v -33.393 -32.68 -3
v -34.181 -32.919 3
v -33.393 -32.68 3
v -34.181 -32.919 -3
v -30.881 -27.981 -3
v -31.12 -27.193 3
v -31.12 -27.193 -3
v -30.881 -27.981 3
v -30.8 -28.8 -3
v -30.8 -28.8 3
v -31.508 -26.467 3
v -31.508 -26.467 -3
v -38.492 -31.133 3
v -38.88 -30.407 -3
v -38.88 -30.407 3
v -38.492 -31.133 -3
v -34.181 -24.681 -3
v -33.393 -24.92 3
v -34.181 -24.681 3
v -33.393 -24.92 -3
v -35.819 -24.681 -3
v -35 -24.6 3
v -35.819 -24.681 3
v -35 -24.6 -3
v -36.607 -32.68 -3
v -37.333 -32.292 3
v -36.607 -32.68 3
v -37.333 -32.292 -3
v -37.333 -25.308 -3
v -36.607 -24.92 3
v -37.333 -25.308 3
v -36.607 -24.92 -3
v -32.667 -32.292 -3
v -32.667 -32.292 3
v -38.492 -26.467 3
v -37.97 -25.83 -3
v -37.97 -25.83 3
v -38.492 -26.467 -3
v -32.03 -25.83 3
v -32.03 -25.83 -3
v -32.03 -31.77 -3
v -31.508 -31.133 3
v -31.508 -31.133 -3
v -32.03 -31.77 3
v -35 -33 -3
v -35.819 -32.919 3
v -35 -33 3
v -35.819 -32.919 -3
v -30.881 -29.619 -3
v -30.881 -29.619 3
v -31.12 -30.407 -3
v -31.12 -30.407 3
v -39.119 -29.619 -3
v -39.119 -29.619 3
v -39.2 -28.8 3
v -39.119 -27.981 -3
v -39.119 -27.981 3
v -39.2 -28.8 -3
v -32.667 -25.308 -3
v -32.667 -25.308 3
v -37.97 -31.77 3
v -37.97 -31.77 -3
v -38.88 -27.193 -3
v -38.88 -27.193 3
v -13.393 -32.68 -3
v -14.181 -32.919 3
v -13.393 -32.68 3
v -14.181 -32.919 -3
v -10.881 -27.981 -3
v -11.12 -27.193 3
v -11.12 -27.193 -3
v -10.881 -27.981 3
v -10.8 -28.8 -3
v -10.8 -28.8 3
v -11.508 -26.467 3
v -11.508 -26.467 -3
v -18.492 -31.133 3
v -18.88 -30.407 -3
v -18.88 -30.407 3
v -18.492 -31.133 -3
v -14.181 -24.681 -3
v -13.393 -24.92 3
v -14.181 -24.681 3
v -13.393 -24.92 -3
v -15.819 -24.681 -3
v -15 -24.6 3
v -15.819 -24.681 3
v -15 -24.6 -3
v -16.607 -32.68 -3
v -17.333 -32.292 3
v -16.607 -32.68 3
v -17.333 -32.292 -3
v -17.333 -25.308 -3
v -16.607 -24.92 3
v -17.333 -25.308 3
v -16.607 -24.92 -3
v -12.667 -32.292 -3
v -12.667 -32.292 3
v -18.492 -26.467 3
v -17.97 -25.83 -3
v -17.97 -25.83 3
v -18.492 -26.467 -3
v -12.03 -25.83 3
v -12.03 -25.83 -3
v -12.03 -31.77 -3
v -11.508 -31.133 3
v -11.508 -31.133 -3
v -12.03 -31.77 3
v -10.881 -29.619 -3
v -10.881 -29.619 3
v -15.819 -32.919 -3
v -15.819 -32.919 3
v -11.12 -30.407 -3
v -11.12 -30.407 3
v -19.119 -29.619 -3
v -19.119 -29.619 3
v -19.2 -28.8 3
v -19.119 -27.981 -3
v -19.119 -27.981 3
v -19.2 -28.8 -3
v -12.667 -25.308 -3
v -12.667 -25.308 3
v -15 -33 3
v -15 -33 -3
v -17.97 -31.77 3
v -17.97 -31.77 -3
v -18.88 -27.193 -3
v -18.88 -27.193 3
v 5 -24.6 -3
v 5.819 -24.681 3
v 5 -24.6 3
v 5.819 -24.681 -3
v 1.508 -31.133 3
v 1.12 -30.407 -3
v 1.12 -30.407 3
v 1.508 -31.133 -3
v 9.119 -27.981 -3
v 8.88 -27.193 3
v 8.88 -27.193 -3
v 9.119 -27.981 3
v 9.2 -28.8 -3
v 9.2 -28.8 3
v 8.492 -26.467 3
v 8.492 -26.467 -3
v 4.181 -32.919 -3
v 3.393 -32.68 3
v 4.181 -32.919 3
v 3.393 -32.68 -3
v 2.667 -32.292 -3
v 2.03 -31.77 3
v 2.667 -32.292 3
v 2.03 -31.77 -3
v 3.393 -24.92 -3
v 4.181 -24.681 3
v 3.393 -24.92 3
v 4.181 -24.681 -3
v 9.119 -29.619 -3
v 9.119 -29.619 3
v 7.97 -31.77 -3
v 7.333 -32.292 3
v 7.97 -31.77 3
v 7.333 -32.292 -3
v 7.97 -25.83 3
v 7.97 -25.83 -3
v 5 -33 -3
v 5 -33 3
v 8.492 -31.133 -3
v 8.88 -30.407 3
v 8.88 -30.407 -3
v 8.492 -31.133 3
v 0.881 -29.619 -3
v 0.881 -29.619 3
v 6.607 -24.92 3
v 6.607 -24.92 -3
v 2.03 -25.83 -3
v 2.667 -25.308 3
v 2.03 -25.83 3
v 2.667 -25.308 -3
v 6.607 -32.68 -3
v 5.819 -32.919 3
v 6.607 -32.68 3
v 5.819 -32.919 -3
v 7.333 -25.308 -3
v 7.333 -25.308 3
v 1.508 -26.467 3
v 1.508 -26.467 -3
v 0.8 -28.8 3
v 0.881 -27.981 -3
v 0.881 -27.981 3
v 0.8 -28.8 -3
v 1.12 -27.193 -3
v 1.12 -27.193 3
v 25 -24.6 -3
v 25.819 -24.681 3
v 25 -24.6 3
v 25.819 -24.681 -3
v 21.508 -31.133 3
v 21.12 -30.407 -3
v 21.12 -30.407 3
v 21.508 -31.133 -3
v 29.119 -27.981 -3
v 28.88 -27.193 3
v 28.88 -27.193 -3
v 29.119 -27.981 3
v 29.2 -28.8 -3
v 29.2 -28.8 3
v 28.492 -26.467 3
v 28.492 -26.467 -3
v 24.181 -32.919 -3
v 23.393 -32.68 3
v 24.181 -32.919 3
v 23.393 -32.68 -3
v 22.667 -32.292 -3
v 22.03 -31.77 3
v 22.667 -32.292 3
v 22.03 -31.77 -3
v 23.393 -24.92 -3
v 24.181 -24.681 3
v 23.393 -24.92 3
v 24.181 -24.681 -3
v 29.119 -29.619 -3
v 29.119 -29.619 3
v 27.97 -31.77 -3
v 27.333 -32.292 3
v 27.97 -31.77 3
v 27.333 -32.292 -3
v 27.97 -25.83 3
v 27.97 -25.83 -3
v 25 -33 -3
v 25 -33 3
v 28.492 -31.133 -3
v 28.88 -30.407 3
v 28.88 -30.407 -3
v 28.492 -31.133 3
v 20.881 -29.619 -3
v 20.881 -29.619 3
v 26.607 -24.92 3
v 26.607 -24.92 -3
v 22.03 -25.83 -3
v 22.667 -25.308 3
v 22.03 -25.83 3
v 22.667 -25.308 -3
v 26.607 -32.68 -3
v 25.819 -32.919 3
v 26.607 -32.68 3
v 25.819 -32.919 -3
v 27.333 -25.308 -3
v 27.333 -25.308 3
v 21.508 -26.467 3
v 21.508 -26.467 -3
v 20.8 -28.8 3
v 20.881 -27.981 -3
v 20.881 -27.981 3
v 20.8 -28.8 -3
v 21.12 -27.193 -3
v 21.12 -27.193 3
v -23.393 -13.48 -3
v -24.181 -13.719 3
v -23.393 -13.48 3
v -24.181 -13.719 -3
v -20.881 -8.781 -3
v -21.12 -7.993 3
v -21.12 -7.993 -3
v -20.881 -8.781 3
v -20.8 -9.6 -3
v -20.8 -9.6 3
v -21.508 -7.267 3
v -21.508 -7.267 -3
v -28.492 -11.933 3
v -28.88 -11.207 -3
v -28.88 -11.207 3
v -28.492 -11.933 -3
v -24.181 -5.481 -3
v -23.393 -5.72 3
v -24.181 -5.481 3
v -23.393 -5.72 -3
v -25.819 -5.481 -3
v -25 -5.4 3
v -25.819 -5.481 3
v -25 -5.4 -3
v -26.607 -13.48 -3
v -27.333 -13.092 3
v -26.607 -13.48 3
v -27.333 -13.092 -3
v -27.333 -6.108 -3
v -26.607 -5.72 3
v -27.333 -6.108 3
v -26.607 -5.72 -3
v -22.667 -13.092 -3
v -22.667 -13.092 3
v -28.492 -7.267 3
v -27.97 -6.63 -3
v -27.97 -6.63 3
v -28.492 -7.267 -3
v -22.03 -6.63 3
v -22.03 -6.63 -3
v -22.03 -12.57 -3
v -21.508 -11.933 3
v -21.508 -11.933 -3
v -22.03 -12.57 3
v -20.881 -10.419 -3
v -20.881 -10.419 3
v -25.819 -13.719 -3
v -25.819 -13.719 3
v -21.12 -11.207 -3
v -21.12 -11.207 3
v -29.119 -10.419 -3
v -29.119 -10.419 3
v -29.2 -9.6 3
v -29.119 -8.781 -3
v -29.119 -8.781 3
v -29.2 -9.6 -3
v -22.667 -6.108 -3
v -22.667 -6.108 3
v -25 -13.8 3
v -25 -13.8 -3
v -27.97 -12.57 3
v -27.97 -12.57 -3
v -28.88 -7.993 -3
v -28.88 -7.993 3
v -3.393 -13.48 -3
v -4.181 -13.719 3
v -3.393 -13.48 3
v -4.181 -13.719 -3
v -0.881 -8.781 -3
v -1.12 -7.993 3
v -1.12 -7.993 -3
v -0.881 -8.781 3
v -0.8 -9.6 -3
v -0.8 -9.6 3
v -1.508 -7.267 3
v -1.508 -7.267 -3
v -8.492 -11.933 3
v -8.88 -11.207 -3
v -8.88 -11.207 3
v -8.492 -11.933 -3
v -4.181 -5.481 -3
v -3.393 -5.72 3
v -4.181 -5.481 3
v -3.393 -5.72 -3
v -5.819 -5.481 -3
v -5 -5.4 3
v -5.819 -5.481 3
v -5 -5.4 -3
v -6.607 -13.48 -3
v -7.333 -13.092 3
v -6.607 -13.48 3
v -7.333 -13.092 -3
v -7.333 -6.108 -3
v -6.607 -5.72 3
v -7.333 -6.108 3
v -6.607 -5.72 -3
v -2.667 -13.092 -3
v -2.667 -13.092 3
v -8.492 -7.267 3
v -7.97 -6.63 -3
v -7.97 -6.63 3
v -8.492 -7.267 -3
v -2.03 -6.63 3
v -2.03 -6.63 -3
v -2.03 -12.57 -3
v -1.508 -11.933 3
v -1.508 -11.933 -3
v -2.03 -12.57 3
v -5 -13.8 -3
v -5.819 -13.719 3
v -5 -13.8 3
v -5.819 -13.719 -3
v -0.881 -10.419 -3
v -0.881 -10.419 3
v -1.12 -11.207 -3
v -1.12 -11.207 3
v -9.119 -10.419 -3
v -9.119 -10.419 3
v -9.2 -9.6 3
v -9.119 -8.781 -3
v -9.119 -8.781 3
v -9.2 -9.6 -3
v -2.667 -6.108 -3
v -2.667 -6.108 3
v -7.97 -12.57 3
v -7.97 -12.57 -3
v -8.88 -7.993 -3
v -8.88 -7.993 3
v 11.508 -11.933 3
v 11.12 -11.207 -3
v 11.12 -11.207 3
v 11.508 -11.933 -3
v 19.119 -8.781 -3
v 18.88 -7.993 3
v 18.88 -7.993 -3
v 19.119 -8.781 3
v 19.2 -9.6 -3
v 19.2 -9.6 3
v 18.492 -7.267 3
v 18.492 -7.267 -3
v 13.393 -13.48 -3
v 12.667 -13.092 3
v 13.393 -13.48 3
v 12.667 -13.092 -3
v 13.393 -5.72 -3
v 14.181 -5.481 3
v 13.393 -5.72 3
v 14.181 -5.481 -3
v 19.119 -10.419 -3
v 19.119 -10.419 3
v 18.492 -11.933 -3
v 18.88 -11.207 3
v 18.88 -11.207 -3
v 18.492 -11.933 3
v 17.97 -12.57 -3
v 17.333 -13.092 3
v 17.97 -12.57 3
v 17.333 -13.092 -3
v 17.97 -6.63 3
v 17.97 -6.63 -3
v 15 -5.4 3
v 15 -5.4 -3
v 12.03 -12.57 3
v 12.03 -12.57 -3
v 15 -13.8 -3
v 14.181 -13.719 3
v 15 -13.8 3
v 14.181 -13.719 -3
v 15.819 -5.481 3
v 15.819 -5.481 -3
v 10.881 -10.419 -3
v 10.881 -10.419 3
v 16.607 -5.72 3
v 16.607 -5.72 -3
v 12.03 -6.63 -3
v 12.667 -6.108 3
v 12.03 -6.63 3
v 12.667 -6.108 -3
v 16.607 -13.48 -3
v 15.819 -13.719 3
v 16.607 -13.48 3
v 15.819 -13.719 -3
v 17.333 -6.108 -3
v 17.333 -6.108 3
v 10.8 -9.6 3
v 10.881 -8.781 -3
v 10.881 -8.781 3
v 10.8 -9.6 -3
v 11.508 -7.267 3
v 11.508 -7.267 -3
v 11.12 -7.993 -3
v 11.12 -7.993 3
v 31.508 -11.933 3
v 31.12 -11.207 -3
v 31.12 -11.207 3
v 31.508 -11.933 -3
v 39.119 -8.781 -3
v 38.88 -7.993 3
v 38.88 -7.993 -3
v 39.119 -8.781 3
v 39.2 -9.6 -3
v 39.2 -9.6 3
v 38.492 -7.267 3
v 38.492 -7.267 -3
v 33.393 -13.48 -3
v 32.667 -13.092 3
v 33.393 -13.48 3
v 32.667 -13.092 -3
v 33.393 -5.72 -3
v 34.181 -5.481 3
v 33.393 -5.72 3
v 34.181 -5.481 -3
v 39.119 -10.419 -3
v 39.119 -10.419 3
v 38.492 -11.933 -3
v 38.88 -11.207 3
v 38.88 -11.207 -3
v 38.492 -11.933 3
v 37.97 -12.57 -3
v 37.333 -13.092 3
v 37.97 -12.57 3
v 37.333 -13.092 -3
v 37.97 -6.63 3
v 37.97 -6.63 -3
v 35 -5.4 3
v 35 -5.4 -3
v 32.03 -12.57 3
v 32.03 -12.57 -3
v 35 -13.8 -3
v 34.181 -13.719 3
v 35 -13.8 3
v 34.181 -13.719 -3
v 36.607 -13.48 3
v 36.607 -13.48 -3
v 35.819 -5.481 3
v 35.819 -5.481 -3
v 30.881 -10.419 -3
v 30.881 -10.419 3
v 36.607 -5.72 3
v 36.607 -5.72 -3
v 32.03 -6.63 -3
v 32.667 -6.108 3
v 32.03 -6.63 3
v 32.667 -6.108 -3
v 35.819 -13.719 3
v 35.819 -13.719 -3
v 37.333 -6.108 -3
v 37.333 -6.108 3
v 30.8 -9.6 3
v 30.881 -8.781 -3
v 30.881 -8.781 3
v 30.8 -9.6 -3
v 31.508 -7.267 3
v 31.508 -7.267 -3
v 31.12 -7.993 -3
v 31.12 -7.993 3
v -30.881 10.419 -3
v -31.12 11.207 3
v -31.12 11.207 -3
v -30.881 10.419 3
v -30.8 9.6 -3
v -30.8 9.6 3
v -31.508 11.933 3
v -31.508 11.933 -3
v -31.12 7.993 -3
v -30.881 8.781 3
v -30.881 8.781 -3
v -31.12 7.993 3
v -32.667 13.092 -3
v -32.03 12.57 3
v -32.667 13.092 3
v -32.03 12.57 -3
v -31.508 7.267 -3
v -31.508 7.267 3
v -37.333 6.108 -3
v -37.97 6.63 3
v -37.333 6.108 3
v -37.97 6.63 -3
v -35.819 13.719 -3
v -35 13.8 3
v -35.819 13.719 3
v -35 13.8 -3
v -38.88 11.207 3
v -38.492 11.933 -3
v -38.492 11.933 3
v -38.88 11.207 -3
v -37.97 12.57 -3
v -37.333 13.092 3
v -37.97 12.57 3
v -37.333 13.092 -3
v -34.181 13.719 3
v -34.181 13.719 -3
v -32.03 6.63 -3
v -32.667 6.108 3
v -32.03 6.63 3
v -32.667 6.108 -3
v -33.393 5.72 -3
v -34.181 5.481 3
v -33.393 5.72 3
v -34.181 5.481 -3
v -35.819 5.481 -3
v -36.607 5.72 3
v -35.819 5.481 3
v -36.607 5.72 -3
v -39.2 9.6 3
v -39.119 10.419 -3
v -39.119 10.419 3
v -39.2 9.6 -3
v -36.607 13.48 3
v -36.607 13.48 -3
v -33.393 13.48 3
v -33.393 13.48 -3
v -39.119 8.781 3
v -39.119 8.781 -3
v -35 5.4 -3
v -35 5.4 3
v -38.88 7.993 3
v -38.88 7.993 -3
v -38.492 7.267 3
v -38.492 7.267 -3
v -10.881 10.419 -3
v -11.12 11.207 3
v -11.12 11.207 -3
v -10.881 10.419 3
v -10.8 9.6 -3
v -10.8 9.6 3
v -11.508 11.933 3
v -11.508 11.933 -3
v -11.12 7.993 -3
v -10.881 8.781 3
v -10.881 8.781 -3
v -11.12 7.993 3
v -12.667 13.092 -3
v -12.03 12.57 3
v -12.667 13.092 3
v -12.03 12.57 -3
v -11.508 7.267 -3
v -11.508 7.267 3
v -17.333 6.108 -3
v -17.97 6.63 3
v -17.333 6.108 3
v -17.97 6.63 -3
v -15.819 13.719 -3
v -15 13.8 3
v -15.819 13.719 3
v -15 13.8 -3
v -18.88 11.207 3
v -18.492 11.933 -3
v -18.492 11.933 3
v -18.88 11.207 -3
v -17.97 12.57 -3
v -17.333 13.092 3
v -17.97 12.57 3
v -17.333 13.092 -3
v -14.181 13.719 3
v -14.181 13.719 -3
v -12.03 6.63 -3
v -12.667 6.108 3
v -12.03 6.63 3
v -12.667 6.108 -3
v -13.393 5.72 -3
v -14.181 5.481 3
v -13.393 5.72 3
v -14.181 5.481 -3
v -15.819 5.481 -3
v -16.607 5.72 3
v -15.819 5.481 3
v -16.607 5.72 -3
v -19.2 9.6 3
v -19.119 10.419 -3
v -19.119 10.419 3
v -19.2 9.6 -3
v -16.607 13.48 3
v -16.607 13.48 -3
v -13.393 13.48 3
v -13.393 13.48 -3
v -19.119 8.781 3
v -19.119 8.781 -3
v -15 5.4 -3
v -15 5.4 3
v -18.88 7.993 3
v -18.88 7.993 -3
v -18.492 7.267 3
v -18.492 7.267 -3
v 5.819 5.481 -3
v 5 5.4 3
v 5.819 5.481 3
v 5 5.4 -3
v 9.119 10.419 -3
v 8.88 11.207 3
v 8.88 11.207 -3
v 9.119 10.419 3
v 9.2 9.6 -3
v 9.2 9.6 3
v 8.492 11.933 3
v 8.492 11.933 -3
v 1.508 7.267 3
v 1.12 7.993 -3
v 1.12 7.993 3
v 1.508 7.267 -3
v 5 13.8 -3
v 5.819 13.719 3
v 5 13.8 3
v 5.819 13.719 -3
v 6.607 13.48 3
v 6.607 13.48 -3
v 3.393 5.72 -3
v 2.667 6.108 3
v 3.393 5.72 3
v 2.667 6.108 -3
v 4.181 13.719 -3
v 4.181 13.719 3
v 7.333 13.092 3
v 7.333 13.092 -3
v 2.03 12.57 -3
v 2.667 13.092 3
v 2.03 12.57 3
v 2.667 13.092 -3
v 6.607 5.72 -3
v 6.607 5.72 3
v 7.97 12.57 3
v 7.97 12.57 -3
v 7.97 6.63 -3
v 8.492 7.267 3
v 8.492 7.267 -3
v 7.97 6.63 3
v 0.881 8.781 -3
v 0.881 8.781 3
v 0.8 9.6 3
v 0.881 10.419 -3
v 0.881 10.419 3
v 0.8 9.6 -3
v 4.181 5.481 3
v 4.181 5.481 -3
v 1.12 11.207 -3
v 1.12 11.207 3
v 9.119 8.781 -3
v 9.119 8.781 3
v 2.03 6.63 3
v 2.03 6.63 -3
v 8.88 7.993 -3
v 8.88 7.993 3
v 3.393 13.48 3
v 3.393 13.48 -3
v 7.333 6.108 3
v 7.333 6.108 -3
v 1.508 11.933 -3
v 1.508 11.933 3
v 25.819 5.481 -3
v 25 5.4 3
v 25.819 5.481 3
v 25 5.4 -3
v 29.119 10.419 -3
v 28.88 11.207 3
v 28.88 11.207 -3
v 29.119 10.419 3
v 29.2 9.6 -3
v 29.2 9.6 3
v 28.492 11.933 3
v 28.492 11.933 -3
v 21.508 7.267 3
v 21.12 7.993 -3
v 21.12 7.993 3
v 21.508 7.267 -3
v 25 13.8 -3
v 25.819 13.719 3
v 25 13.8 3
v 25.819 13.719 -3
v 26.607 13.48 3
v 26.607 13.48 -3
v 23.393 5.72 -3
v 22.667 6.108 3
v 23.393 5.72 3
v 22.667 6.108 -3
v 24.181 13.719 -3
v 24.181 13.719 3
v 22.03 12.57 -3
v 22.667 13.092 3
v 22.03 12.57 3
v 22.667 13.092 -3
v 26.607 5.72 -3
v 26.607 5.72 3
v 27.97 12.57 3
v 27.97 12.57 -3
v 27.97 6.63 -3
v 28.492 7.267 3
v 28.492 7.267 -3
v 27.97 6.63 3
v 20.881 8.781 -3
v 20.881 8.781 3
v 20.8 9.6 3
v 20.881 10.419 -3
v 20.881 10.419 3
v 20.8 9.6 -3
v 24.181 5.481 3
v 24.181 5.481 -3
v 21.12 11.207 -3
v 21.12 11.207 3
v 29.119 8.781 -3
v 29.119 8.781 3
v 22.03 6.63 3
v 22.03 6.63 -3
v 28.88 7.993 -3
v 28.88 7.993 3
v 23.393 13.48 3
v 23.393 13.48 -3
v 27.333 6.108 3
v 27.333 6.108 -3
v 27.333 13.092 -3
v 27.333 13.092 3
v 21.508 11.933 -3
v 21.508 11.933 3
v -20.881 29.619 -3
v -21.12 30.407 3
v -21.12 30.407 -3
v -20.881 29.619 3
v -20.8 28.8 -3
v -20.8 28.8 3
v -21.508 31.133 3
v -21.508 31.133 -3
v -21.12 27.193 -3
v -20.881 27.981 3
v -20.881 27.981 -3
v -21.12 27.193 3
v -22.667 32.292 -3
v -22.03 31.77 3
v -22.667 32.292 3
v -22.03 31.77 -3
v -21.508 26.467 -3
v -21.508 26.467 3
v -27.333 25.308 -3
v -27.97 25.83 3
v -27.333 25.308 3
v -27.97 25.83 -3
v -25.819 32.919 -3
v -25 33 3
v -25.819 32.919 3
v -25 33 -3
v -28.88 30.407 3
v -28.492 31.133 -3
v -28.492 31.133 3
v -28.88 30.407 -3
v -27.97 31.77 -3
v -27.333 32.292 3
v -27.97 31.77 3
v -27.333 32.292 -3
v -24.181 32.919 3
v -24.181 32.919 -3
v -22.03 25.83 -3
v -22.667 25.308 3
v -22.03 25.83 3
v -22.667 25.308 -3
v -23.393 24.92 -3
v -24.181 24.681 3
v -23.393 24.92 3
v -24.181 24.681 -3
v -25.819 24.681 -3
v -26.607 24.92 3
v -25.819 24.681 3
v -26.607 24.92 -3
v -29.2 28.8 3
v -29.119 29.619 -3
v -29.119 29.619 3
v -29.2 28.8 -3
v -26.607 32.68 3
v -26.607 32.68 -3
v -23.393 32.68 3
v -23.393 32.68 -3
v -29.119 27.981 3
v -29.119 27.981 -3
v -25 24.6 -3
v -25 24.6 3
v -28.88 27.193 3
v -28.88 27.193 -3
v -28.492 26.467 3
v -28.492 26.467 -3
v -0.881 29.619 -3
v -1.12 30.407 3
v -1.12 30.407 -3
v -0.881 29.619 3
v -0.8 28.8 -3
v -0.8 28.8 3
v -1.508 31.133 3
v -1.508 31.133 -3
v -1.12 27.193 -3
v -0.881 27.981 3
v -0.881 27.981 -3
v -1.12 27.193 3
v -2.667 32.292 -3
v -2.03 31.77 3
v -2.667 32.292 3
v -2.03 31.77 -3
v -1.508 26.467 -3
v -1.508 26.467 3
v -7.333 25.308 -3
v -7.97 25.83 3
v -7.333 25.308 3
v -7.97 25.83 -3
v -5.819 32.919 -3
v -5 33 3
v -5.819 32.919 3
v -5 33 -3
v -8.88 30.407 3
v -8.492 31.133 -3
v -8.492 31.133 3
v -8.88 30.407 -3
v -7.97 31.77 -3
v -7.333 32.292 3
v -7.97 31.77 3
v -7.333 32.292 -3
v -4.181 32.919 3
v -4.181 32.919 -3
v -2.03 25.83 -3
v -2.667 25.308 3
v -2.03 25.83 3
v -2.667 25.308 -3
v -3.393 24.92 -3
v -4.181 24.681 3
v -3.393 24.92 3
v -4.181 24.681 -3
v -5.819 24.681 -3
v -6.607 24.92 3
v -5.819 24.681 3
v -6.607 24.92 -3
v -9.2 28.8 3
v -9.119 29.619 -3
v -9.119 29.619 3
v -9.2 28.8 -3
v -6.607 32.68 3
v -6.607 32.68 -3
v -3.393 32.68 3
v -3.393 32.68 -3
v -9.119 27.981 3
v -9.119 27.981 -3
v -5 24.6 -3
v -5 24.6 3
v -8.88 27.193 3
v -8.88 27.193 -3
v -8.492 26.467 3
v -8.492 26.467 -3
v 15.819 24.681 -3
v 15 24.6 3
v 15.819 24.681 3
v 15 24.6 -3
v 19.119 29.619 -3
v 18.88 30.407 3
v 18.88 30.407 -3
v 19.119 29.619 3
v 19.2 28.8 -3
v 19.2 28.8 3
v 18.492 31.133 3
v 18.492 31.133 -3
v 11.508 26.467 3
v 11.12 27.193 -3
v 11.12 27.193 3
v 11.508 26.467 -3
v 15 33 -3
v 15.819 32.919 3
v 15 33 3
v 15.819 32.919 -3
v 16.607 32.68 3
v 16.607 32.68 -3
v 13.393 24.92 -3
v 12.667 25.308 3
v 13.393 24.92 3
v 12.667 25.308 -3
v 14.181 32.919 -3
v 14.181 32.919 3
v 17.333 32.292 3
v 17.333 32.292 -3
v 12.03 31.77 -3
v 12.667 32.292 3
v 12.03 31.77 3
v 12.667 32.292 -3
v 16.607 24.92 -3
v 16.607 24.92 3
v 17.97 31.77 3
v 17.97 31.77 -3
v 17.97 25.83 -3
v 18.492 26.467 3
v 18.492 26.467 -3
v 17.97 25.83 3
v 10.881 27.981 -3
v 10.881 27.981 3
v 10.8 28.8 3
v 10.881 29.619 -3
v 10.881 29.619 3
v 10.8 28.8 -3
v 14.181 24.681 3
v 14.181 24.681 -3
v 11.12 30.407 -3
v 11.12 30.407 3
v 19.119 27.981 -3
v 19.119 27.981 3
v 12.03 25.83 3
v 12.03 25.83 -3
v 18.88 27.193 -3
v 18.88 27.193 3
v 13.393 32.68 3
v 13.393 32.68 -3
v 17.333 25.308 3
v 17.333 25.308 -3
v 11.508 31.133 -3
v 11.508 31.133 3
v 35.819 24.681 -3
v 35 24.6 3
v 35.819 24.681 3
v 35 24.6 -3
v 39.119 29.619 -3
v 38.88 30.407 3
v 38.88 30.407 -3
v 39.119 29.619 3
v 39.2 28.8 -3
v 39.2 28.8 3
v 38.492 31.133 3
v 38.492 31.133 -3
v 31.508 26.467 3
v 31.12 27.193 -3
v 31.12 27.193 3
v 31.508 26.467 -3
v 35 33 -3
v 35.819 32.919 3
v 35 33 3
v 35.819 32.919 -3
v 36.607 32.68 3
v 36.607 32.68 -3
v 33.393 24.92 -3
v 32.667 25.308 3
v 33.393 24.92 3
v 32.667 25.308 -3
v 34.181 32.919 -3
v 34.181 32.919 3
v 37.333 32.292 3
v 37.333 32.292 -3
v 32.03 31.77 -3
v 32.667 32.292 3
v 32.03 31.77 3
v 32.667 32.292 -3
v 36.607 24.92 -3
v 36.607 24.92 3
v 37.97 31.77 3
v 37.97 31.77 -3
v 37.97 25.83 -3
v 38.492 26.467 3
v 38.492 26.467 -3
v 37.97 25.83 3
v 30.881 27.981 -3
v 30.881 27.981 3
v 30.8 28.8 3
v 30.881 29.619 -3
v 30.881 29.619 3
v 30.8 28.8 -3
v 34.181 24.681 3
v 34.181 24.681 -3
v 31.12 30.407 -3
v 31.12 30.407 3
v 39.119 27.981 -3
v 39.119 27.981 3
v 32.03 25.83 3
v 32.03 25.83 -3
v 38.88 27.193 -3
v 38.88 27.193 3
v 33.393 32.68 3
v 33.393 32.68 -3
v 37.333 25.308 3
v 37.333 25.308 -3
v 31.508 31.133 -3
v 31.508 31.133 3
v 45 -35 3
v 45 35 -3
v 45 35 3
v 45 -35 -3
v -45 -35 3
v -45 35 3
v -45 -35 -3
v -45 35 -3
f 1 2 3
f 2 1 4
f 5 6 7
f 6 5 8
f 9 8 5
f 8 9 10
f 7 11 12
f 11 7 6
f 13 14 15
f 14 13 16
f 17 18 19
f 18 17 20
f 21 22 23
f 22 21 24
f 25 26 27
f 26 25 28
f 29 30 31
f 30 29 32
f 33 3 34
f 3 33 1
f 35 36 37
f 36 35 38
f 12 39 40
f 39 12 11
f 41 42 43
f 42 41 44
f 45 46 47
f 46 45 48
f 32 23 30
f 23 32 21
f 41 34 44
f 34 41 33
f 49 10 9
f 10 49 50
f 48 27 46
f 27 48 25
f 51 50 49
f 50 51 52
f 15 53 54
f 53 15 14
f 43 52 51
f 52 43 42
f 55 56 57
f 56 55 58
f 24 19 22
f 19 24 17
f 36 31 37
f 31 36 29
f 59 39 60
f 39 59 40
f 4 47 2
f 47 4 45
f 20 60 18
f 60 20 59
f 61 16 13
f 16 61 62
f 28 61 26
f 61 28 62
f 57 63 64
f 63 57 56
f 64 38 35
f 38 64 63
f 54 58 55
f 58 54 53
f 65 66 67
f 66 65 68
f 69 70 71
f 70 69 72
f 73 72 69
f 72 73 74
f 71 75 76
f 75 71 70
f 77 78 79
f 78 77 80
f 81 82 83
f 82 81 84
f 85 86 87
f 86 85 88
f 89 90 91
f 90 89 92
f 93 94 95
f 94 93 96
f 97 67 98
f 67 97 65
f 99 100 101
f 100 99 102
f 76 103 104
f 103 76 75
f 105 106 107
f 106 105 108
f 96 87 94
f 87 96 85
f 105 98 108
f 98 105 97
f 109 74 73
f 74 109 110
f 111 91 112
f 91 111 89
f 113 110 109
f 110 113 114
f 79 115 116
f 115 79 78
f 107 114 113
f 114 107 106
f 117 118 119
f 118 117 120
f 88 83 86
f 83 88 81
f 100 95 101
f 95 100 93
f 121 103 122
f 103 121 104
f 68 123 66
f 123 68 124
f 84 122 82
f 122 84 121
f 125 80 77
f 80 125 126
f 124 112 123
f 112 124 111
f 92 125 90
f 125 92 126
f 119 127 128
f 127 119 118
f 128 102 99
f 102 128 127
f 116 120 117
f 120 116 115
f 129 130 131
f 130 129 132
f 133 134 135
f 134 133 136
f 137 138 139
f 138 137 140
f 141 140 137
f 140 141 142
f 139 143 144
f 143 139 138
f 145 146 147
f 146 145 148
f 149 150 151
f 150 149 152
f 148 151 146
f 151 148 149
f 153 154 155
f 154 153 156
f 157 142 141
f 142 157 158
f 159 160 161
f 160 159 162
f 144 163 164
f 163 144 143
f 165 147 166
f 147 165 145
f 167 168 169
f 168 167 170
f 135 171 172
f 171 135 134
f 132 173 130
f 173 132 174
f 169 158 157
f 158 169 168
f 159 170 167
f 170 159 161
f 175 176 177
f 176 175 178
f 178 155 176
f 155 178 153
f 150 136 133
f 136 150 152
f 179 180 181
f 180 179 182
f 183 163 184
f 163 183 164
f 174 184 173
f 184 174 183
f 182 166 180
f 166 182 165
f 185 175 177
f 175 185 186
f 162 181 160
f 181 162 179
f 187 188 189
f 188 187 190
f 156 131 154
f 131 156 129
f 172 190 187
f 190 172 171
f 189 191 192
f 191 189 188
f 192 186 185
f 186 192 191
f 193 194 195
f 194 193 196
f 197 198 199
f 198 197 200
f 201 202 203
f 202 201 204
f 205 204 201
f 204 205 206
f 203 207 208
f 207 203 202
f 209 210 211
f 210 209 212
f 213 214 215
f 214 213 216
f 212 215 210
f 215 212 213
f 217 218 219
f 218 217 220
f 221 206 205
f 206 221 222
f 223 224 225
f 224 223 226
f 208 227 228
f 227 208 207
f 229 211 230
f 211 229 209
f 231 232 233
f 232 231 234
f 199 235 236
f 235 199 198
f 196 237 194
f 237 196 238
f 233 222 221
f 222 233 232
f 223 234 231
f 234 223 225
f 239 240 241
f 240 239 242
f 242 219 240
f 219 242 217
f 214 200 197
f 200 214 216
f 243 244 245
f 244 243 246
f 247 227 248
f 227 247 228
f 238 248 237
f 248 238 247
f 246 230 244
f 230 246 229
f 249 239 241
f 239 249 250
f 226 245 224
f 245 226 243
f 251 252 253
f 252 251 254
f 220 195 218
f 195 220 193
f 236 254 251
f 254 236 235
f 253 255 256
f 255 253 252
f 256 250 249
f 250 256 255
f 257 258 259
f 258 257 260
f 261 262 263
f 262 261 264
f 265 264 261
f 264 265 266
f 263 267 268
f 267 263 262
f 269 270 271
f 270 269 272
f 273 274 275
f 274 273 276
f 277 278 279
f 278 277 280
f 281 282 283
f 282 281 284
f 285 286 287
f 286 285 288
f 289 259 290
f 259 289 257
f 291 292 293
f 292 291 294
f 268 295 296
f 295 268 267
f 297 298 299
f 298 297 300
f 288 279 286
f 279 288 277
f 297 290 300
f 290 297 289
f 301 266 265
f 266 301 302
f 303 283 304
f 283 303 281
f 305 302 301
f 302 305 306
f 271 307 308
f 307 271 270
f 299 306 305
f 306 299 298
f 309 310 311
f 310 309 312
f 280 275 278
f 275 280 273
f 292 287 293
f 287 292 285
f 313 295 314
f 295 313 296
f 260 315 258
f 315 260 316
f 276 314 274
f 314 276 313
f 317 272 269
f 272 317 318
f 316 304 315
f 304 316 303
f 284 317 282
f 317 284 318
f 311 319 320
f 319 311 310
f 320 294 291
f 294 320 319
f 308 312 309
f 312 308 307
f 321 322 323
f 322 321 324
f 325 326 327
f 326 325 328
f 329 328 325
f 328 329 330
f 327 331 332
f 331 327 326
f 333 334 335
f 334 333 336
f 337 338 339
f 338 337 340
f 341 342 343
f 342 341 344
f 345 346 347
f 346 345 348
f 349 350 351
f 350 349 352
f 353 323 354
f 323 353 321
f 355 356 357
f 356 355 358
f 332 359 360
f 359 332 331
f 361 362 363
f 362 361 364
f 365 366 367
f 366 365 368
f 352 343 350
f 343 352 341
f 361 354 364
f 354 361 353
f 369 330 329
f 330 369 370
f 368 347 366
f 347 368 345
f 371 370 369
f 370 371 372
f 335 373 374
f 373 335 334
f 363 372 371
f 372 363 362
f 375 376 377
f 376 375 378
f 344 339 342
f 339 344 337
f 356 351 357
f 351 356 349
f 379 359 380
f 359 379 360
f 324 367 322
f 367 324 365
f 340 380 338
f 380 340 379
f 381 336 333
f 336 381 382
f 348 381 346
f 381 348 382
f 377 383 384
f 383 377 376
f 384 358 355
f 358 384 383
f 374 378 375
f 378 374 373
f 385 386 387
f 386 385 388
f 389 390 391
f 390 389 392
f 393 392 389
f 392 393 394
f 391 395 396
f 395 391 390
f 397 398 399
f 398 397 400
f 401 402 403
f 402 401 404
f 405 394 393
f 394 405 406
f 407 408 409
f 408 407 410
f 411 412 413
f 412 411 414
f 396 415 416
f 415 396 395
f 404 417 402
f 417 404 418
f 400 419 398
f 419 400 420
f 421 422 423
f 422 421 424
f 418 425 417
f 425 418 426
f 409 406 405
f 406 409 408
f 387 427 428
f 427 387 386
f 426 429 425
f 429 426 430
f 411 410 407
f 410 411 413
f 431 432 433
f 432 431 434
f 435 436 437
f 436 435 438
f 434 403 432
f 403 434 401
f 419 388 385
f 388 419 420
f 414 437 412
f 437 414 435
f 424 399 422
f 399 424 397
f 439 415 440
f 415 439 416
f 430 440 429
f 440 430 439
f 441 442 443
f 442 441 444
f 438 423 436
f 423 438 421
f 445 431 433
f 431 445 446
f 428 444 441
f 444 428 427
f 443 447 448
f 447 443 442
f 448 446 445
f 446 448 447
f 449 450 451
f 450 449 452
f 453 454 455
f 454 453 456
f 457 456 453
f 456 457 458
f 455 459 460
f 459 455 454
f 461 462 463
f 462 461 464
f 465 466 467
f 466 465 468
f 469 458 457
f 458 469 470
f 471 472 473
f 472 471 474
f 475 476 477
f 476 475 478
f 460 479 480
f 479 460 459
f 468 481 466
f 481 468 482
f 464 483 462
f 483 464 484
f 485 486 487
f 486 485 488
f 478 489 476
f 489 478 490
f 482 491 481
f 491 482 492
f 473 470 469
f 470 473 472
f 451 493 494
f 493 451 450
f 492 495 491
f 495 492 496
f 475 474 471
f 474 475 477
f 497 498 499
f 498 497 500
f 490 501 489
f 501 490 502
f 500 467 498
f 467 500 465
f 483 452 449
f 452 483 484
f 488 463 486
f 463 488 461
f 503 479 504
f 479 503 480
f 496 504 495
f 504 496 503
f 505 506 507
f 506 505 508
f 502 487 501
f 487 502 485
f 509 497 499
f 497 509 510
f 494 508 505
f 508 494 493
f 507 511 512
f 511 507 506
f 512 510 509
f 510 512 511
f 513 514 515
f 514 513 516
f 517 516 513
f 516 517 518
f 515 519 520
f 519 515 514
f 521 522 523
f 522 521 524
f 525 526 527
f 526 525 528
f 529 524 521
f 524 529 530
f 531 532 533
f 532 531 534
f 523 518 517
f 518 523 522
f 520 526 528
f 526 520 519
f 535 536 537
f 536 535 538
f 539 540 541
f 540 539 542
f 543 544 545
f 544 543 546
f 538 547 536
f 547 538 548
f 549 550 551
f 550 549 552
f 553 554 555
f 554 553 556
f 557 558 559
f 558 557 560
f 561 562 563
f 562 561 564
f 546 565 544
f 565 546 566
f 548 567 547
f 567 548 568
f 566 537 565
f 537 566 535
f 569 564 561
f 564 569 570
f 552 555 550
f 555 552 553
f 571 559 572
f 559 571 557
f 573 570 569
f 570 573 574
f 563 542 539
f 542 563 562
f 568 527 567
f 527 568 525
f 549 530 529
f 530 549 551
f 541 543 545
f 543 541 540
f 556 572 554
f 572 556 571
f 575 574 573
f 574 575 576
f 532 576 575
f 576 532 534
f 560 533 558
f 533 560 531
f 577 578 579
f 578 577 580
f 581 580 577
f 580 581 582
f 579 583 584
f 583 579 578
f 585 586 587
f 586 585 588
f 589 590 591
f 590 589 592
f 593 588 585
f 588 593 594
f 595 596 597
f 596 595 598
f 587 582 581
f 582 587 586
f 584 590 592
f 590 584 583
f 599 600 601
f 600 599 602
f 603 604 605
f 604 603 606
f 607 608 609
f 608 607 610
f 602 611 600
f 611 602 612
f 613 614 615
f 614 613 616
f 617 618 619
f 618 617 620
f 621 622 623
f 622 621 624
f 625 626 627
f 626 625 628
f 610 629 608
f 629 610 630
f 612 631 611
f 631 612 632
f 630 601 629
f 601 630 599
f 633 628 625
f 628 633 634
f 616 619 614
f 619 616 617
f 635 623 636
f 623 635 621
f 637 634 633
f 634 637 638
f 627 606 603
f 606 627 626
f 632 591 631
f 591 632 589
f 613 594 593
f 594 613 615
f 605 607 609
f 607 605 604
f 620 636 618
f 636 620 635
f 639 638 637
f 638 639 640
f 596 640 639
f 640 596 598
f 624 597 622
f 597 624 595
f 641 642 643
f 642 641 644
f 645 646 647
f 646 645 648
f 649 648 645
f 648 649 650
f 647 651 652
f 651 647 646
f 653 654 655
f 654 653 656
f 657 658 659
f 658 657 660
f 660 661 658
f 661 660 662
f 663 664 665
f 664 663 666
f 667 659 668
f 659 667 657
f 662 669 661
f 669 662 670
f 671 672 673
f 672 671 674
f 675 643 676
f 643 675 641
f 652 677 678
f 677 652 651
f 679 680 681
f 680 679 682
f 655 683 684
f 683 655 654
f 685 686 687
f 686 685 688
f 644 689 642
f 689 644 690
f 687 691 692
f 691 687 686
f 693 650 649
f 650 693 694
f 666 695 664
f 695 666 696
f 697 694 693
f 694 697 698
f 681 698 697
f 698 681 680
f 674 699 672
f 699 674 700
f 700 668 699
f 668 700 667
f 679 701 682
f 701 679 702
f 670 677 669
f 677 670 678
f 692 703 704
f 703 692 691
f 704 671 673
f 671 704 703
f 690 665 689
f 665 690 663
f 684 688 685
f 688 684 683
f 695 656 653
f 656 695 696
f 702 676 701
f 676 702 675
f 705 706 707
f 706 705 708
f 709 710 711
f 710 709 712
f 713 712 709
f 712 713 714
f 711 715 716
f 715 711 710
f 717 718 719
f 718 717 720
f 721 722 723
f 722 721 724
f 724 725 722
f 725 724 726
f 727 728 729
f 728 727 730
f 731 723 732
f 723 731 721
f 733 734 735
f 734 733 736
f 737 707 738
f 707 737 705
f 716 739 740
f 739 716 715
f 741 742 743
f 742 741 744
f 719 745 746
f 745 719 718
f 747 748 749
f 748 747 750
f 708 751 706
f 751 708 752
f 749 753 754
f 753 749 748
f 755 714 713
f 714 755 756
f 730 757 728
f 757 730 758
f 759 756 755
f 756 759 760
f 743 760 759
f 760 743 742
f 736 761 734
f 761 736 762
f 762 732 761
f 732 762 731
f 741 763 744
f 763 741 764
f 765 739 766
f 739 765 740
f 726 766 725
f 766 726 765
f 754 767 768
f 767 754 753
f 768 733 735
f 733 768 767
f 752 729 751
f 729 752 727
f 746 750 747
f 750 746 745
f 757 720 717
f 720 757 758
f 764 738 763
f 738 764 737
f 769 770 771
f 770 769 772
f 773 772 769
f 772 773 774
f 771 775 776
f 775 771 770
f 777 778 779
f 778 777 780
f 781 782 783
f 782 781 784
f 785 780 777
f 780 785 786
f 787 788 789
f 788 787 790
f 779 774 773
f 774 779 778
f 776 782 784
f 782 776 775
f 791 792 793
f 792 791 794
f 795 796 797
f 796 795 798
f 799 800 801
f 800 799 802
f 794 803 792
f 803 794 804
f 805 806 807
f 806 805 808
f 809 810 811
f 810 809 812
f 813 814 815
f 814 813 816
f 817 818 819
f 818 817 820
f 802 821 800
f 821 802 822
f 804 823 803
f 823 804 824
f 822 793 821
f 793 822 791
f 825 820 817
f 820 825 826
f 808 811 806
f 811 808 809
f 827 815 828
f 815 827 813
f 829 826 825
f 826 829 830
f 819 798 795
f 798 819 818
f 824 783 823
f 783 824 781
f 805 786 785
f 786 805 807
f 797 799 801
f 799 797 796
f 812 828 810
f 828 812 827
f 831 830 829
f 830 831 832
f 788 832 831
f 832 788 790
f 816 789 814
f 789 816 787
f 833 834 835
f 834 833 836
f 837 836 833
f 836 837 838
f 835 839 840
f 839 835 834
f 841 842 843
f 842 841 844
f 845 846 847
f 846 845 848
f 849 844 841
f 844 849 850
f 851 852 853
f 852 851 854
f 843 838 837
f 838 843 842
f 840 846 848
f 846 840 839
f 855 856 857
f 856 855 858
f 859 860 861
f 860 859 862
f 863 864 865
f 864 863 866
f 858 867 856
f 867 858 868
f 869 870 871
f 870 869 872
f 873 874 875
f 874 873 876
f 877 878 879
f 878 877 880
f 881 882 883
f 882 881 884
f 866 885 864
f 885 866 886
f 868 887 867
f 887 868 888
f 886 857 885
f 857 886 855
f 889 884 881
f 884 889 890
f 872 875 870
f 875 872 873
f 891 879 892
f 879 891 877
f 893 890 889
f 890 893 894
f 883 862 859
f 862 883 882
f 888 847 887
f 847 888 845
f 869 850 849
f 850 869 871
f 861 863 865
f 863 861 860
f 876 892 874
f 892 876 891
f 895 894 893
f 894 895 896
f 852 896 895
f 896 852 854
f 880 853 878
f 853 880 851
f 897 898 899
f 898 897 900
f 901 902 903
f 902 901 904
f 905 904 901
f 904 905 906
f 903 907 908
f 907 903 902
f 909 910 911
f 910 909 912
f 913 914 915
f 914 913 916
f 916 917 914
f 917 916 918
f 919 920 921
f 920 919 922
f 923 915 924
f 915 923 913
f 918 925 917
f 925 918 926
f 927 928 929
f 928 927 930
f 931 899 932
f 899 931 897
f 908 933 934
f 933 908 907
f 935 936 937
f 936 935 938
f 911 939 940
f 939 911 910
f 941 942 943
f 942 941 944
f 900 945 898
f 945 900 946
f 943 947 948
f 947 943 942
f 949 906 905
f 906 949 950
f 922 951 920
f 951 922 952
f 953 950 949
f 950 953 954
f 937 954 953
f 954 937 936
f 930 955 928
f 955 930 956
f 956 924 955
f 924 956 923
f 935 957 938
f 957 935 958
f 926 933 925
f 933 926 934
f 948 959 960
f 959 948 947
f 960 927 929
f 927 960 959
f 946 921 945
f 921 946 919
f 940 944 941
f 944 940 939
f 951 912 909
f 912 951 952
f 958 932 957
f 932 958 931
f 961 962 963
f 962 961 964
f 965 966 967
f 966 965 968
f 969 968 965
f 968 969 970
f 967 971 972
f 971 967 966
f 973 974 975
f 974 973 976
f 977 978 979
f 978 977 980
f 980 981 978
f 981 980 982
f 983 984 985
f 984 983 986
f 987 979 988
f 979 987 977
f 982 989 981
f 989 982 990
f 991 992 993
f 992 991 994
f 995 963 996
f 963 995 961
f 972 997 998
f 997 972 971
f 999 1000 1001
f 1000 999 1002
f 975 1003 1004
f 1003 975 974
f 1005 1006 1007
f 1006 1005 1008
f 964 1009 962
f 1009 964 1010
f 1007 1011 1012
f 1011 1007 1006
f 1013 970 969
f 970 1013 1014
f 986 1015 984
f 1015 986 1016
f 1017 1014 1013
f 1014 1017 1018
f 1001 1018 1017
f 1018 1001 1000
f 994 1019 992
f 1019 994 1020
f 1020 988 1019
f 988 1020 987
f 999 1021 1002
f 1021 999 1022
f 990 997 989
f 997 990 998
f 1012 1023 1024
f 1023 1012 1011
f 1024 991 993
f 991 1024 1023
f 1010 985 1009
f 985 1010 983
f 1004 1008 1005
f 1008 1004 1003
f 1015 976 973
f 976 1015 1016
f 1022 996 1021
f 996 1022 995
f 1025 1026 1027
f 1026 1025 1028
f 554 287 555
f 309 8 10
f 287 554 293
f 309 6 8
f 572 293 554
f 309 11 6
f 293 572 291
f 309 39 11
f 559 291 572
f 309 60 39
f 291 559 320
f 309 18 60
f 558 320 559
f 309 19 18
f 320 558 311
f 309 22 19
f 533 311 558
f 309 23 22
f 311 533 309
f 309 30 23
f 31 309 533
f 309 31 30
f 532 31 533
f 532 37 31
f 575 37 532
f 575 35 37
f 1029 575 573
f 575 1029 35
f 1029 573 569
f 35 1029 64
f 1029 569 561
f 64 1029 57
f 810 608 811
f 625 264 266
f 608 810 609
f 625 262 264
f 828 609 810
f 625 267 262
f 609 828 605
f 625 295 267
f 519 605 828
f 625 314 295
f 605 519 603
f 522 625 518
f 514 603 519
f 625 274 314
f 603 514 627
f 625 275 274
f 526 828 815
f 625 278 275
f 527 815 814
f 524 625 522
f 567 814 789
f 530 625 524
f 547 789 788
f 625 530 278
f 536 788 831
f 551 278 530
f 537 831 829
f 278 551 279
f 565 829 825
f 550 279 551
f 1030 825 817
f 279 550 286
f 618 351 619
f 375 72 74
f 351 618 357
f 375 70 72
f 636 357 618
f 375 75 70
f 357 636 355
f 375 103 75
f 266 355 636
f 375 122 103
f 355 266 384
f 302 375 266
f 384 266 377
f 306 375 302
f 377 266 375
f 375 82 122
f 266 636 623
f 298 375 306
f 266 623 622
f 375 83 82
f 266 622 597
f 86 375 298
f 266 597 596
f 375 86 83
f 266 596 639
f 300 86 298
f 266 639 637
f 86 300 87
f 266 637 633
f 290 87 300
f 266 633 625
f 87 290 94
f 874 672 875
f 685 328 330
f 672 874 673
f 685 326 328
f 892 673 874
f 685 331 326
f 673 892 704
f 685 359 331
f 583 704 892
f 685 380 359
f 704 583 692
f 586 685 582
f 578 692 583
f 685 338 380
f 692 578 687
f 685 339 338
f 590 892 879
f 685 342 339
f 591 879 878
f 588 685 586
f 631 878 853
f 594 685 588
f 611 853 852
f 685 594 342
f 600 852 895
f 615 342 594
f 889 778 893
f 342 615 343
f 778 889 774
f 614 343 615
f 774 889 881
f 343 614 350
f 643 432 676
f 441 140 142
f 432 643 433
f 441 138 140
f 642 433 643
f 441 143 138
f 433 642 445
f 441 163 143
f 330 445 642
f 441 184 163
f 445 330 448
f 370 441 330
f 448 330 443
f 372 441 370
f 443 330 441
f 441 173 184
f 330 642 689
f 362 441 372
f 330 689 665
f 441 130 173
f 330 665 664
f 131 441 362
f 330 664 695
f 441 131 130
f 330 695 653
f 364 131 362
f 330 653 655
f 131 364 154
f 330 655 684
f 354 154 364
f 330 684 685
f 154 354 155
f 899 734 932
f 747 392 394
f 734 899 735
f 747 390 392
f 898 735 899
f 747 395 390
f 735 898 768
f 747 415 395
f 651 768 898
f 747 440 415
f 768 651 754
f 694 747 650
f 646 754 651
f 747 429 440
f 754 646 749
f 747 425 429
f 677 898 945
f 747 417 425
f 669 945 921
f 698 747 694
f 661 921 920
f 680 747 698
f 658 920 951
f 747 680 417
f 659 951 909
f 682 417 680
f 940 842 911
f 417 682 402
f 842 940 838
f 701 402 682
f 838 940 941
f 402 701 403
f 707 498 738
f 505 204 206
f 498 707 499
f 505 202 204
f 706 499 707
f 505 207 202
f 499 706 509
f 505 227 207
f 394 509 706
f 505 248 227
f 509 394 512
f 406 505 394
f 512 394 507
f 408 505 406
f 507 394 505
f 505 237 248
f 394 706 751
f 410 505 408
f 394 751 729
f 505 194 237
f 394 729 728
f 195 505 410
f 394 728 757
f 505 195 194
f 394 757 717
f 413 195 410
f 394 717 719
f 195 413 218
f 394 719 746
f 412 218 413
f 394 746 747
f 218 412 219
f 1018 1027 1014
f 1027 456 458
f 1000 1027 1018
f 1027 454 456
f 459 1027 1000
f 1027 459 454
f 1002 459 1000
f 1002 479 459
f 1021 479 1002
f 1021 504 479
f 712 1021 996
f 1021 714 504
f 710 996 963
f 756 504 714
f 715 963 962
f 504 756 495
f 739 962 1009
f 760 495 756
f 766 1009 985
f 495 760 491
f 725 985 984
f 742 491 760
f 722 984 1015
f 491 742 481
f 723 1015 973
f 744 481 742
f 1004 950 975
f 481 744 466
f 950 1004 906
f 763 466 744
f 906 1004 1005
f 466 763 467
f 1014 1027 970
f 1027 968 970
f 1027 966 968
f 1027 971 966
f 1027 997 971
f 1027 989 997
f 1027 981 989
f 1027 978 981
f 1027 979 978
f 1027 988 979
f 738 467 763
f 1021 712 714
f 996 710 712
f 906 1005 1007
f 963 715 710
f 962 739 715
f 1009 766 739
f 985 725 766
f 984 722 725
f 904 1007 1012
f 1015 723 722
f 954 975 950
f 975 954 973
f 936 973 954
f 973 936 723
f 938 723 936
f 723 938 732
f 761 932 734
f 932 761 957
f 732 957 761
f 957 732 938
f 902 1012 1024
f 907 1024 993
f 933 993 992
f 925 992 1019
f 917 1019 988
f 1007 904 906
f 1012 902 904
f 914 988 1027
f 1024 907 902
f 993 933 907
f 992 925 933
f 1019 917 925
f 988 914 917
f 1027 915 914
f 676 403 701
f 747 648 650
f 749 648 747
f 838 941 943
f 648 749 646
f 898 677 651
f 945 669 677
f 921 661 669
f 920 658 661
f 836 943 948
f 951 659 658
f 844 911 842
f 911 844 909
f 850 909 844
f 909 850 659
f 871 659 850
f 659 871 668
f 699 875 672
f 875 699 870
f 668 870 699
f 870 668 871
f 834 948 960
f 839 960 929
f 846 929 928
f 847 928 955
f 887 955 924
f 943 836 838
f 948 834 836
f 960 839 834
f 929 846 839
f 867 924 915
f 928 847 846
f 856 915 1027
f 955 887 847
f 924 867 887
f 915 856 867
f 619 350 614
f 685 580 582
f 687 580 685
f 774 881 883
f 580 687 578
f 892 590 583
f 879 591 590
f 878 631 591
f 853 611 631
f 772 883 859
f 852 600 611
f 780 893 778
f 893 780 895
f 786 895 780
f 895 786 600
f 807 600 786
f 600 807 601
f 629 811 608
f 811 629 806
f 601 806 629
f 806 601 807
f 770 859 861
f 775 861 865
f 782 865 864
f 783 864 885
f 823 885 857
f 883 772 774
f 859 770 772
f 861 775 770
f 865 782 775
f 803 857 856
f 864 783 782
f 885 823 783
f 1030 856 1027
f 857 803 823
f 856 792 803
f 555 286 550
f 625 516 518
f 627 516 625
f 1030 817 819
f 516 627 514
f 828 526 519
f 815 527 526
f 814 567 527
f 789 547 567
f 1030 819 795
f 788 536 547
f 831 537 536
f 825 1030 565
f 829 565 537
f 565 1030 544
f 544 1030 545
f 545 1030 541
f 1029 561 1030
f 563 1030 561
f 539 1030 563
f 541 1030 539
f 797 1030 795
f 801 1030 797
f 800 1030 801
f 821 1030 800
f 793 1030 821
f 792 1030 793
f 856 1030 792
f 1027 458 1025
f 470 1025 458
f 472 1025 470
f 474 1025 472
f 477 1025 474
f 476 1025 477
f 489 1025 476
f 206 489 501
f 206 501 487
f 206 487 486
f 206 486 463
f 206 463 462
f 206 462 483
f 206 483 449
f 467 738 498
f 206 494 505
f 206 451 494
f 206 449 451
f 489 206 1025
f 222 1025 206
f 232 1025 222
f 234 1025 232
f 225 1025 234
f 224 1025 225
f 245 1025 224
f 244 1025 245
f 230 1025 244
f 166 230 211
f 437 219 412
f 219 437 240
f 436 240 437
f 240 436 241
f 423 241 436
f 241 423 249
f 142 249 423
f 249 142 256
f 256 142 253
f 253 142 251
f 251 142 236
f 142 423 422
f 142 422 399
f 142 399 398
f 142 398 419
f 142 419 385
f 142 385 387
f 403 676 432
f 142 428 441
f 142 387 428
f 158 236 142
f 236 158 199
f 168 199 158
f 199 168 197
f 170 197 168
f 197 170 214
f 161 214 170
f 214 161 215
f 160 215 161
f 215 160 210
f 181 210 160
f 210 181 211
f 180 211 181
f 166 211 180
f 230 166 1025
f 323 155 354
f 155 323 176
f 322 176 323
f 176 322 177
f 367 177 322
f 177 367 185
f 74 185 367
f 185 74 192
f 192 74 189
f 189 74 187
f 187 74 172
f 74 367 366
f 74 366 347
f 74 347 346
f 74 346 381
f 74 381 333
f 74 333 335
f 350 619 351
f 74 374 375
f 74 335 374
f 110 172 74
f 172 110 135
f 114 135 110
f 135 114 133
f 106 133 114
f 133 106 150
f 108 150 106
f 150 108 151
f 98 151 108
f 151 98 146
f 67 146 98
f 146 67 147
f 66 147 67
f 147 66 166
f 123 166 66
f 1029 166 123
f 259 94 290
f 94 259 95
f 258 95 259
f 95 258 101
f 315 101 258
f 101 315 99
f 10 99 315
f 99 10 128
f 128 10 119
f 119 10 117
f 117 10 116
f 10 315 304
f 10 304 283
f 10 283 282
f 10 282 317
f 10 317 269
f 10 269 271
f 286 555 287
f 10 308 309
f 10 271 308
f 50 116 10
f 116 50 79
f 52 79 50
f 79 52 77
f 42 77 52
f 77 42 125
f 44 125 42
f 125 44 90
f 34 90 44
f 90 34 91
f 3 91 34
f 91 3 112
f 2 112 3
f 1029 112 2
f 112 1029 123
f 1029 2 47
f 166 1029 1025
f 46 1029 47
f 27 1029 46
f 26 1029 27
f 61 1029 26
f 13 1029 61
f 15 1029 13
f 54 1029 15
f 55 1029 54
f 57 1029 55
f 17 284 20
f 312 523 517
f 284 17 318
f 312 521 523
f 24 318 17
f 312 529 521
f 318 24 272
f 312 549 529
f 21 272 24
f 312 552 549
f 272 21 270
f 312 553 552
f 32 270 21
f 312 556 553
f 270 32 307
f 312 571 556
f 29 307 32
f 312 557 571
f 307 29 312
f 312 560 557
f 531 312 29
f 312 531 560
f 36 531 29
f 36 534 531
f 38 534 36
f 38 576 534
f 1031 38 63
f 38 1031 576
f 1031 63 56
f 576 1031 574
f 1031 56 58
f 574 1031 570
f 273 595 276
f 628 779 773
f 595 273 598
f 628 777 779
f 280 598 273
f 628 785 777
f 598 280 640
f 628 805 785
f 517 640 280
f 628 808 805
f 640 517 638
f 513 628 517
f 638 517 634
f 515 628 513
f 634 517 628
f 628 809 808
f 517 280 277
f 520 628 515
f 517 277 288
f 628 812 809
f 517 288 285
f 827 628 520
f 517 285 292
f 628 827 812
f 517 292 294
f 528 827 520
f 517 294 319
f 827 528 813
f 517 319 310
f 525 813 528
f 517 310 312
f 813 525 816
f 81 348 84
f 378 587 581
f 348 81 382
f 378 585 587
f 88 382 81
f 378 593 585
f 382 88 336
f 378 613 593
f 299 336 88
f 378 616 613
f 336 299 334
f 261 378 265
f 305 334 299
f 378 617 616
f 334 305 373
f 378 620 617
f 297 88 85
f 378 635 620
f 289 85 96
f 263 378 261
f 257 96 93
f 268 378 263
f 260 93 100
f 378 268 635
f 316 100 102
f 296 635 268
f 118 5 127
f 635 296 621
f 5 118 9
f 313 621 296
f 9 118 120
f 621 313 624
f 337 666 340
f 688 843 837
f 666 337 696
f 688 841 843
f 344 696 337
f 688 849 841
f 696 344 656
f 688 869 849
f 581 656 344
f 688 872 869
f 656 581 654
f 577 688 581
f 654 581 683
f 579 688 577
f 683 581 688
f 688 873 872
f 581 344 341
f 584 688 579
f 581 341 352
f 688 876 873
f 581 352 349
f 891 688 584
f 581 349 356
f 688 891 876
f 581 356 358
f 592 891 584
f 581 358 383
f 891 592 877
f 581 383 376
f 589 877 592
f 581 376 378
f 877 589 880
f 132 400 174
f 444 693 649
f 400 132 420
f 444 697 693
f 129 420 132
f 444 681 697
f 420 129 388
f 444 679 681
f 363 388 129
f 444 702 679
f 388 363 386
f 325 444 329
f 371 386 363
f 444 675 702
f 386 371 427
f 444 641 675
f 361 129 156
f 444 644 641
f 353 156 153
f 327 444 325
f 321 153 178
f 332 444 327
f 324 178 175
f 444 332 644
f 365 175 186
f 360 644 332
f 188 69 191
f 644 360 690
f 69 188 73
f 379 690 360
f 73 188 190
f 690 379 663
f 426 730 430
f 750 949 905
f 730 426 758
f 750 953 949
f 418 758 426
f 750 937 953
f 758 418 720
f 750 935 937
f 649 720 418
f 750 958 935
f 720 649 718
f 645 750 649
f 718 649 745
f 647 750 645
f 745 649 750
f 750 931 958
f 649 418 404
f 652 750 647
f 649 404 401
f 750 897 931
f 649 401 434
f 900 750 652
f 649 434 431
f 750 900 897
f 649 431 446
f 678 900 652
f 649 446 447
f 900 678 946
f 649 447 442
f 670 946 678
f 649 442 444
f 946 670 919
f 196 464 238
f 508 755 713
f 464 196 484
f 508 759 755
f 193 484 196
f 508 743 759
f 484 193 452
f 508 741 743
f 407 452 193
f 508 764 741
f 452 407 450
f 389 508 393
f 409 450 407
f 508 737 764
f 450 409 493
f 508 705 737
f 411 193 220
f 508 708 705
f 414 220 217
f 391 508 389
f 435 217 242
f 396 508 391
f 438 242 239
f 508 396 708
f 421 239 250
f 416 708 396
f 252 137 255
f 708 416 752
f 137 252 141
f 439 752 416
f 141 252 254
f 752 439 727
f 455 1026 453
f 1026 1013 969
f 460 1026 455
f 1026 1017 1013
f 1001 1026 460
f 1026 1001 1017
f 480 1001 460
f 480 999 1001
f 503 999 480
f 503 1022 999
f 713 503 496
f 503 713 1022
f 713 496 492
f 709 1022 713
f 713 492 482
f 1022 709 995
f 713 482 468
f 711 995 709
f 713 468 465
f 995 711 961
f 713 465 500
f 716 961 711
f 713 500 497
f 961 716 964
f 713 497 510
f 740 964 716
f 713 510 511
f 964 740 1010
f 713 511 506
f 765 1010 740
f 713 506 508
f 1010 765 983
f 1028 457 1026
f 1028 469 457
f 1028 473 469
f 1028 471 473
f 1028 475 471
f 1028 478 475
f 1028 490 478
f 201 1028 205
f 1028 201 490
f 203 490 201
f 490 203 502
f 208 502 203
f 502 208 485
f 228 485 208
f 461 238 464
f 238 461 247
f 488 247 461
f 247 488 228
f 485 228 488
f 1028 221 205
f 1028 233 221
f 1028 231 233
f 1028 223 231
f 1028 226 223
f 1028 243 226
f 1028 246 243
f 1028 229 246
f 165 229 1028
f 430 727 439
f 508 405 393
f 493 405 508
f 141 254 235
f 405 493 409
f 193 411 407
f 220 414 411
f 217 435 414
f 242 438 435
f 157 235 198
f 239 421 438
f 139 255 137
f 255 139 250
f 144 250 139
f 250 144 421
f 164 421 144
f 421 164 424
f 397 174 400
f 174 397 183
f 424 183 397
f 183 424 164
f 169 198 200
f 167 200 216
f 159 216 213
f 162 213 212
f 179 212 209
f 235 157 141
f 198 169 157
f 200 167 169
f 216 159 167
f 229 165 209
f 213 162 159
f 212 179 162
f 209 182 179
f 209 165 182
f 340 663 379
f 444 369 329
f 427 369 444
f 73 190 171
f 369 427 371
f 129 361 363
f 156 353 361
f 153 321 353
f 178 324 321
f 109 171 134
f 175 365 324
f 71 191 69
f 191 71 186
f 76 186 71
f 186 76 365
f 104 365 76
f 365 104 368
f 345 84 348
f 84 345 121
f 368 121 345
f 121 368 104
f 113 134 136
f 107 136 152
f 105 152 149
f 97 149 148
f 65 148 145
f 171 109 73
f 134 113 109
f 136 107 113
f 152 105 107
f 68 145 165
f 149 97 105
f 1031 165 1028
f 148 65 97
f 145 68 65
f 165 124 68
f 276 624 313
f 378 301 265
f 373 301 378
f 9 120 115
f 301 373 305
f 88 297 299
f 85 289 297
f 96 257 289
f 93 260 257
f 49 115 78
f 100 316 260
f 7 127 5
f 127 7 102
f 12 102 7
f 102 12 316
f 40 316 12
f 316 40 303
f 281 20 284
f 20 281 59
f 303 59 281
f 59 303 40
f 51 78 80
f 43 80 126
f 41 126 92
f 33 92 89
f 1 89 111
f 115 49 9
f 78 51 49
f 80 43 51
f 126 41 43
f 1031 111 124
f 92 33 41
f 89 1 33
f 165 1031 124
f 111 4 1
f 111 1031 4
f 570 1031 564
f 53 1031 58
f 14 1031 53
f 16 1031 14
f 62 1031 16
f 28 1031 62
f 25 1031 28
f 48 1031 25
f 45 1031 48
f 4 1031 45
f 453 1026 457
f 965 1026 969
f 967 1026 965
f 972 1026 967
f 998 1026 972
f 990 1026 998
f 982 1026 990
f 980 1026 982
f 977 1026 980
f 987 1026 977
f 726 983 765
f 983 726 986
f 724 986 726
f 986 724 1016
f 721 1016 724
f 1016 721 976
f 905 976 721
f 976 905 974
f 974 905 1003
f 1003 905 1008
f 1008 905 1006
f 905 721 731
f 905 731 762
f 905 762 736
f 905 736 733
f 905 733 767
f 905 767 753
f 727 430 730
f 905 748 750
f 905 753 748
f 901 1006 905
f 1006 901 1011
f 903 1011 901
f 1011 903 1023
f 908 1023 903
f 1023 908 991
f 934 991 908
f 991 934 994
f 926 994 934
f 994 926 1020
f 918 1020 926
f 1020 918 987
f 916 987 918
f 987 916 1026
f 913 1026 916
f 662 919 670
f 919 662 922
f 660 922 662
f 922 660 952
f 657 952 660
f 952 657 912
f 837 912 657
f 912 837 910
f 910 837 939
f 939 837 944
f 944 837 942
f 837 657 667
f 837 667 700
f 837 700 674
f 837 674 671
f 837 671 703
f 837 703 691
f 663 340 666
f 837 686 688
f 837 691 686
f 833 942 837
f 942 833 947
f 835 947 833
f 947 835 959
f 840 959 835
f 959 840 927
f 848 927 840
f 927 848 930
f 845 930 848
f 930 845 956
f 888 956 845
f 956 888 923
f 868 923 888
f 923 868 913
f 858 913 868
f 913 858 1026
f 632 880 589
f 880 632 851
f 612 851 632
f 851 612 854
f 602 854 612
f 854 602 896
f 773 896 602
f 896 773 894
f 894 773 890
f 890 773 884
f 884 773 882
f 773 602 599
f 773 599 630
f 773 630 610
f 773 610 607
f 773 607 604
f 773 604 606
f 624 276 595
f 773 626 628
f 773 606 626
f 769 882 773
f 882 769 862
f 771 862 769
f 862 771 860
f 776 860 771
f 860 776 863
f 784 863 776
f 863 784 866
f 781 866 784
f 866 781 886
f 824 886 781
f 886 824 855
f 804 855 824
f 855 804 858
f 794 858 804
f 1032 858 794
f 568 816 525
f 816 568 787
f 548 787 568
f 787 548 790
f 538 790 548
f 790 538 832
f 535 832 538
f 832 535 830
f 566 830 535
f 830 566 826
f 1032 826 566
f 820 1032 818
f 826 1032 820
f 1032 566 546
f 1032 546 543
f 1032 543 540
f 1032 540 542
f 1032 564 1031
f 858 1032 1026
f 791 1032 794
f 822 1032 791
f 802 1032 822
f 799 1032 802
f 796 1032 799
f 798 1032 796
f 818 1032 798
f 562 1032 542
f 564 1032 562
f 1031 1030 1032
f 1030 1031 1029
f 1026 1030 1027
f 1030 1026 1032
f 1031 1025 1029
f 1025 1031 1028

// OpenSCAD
$fn = 32;

// ----------------------------------------------------------------------
// Perforated panel 90 x 70 x 6
// 4 x 4 Ø8.4 holes, checker layout
// ----------------------------------------------------------------------

// --- parameters (mm) ---
panel = [90, 70, 6];  // overall size (x, y, z)
hole_d = 8.4;         // hole diameter
pitch_x = 20;         // hole pitch along X
pitch_y = 19.2;       // hole pitch along Y

// --- derived feature positions (mm) ---
margin = hole_d / 2 + 2;            // = 6.2   clearance from the panel edge
row_offset = pitch_x / 2;           // = 10   shift of every other row
cols = floor((panel[0] - 2 * margin - row_offset) / pitch_x) + 1;  // = 4   how many columns fit in X
rows = floor((panel[1] - 2 * margin) / pitch_y) + 1;  // = 4   how many rows fit in Y
span_x = (cols - 1) * pitch_x + row_offset;  // = 70   width of the field
span_y = (rows - 1) * pitch_y;      // = 57.6   height of the field
origin_x = -span_x / 2;             // = -35   X of the first hole
origin_y = -span_y / 2;             // = -28.8   Y of the first row
holes = rows * cols;                // = 16   holes in total
feature_centers = [
  [origin_x + 0 * pitch_x, origin_y + 0 * pitch_y],
  [origin_x + 1 * pitch_x, origin_y + 0 * pitch_y],
  [origin_x + 2 * pitch_x, origin_y + 0 * pitch_y],
  [origin_x + 3 * pitch_x, origin_y + 0 * pitch_y],
  [origin_x + row_offset + 0 * pitch_x, origin_y + 1 * pitch_y],
  [origin_x + row_offset + 1 * pitch_x, origin_y + 1 * pitch_y],
  [origin_x + row_offset + 2 * pitch_x, origin_y + 1 * pitch_y],
  [origin_x + row_offset + 3 * pitch_x, origin_y + 1 * pitch_y],
  [origin_x + 0 * pitch_x, origin_y + 2 * pitch_y],
  [origin_x + 1 * pitch_x, origin_y + 2 * pitch_y],
  [origin_x + 2 * pitch_x, origin_y + 2 * pitch_y],
  [origin_x + 3 * pitch_x, origin_y + 2 * pitch_y],
  [origin_x + row_offset + 0 * pitch_x, origin_y + 3 * pitch_y],
  [origin_x + row_offset + 1 * pitch_x, origin_y + 3 * pitch_y],
  [origin_x + row_offset + 2 * pitch_x, origin_y + 3 * pitch_y],
  [origin_x + row_offset + 3 * pitch_x, origin_y + 3 * pitch_y]
];   // hole centres, used verbatim by the cutter loop

// panel outline, every hole through
difference() {
  cube(panel, center = true);
  for (centre = feature_centers)
    translate([centre[0], centre[1], 0])
      cylinder(d = hole_d, h = panel[2] + 2, center = true);
}
